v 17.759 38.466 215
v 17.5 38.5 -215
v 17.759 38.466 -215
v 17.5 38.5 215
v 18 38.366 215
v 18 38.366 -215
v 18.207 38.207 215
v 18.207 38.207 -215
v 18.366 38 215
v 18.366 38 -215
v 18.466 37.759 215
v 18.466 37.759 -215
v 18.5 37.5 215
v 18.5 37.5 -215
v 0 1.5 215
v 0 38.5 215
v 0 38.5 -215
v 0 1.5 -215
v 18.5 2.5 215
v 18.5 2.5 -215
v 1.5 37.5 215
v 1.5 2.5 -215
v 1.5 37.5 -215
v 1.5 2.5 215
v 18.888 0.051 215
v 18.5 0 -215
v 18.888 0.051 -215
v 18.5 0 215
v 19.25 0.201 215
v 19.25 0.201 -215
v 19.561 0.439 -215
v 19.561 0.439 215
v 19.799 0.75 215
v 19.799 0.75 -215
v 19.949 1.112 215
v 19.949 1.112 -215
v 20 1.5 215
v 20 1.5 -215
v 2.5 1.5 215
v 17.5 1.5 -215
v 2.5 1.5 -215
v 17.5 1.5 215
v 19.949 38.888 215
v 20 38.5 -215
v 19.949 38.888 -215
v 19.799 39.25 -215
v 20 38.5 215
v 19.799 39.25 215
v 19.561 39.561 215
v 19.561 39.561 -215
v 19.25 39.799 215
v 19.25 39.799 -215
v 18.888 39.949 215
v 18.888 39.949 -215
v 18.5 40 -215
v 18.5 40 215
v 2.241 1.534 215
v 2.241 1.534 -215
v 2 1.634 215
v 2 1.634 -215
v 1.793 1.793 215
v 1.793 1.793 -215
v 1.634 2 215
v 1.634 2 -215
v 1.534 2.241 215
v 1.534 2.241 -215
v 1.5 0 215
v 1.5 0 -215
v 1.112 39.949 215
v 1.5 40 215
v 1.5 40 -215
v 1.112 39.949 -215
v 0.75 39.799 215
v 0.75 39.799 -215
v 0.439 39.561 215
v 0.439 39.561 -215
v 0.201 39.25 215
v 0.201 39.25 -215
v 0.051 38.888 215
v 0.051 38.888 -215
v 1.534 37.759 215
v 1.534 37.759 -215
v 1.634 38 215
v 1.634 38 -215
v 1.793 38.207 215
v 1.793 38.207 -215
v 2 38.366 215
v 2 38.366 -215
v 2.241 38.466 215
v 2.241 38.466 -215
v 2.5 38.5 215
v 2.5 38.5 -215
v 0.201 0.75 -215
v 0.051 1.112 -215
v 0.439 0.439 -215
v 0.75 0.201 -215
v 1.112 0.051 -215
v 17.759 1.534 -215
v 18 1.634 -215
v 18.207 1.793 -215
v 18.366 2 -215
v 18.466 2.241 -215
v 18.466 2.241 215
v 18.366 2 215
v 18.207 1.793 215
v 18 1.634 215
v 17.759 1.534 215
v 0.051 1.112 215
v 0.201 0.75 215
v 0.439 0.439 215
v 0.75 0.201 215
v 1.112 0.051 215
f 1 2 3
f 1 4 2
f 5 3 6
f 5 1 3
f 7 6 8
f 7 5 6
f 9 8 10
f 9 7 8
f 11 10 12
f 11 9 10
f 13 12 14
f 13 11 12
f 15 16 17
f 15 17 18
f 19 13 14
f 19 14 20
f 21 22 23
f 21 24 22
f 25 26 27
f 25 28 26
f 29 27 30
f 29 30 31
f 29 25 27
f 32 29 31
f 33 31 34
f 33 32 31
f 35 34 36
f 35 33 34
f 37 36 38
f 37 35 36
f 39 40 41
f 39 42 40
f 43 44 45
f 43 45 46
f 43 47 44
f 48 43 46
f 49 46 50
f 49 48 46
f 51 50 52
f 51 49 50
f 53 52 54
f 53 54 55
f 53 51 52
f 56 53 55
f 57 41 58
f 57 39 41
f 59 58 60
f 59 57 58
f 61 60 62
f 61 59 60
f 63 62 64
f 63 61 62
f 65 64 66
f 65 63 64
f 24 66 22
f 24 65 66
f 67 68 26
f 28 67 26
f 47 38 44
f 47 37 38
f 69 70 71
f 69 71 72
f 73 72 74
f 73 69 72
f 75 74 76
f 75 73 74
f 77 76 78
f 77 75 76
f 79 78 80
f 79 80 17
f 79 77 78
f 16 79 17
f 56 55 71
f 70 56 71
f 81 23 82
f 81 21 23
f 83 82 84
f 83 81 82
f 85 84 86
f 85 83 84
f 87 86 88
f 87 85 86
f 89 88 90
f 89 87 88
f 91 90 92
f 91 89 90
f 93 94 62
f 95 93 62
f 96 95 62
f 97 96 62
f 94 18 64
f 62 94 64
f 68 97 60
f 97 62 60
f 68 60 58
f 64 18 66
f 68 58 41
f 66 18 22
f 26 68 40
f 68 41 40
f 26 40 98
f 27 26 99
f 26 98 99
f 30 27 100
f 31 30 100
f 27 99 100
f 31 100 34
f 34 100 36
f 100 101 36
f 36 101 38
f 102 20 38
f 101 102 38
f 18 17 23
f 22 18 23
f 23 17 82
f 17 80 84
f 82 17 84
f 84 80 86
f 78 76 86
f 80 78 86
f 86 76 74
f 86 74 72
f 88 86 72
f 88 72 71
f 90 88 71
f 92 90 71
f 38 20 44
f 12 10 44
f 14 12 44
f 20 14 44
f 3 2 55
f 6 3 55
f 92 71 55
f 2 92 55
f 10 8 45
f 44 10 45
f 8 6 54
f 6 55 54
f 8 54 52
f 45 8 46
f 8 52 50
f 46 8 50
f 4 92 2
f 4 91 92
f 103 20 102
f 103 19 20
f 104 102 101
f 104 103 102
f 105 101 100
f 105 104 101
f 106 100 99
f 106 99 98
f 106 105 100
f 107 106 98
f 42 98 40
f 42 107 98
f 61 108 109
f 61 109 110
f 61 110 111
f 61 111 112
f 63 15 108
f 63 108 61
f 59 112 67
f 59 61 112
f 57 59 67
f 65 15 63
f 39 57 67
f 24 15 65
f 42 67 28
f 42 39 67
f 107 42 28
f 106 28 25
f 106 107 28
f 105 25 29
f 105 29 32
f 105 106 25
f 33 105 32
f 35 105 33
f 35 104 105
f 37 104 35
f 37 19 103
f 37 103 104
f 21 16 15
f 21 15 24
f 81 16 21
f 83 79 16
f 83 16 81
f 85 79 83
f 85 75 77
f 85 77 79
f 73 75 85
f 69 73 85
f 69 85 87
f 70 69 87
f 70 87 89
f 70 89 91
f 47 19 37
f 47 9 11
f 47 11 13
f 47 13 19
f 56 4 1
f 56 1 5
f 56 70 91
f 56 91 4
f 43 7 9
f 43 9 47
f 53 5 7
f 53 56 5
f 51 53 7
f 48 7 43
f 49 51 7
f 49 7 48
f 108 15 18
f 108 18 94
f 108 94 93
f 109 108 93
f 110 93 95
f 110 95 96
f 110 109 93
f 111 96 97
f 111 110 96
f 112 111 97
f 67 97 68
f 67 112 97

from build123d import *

# Parameters (mm, degrees)
EXTRUDE_1_DEPTH = 215


# Read off the part's stored shape, not the designer's step: Бобышка-Вытянуть1
with BuildPart() as part:
    # Бобышка-Вытянуть1 outline → Бобышка-Вытянуть1 (new body)
    with BuildSketch(Plane.XY):
        with BuildLine():
            ThreePointArc((20, 38.5), (19.560660172, 39.560660172), (18.5, 40))
            Line((18.5, 40), (1.5, 40))
            ThreePointArc((1.5, 40), (0.439339828, 39.560660172), (0, 38.5))
            Line((0, 38.5), (0, 1.5))
            ThreePointArc((0, 1.5), (0.439339828, 0.439339828), (1.5, 0))
            Line((1.5, 0), (18.5, 0))
            ThreePointArc((18.5, 0), (19.560660172, 0.439339828), (20, 1.5))
            Line((20, 1.5), (20, 38.5))
        make_face()
        with BuildLine():
            Line((18.5, 37.5), (18.5, 2.5))
            ThreePointArc((18.5, 2.5), (18.207106781, 1.792893219), (17.5, 1.5))
            Line((17.5, 1.5), (2.5, 1.5))
            ThreePointArc((2.5, 1.5), (1.792893219, 1.792893219), (1.5, 2.5))
            Line((1.5, 2.5), (1.5, 37.5))
            ThreePointArc((1.5, 37.5), (1.792893219, 38.207106781), (2.5, 38.5))
            Line((2.5, 38.5), (17.5, 38.5))
            ThreePointArc((17.5, 38.5), (18.207106781, 38.207106781), (18.5, 37.5))
        make_face(mode=Mode.SUBTRACT)
    extrude(amount=EXTRUDE_1_DEPTH)

    # Зеркальное отражение2: part across plane


with BuildPart() as part_1:
    add(part.part)
    add(part.part.mirror(Plane(origin=(18.5, 38.5, 0), x_dir=(1, 0, 0), z_dir=(0, 0, -1))))


solid = part_1.part
